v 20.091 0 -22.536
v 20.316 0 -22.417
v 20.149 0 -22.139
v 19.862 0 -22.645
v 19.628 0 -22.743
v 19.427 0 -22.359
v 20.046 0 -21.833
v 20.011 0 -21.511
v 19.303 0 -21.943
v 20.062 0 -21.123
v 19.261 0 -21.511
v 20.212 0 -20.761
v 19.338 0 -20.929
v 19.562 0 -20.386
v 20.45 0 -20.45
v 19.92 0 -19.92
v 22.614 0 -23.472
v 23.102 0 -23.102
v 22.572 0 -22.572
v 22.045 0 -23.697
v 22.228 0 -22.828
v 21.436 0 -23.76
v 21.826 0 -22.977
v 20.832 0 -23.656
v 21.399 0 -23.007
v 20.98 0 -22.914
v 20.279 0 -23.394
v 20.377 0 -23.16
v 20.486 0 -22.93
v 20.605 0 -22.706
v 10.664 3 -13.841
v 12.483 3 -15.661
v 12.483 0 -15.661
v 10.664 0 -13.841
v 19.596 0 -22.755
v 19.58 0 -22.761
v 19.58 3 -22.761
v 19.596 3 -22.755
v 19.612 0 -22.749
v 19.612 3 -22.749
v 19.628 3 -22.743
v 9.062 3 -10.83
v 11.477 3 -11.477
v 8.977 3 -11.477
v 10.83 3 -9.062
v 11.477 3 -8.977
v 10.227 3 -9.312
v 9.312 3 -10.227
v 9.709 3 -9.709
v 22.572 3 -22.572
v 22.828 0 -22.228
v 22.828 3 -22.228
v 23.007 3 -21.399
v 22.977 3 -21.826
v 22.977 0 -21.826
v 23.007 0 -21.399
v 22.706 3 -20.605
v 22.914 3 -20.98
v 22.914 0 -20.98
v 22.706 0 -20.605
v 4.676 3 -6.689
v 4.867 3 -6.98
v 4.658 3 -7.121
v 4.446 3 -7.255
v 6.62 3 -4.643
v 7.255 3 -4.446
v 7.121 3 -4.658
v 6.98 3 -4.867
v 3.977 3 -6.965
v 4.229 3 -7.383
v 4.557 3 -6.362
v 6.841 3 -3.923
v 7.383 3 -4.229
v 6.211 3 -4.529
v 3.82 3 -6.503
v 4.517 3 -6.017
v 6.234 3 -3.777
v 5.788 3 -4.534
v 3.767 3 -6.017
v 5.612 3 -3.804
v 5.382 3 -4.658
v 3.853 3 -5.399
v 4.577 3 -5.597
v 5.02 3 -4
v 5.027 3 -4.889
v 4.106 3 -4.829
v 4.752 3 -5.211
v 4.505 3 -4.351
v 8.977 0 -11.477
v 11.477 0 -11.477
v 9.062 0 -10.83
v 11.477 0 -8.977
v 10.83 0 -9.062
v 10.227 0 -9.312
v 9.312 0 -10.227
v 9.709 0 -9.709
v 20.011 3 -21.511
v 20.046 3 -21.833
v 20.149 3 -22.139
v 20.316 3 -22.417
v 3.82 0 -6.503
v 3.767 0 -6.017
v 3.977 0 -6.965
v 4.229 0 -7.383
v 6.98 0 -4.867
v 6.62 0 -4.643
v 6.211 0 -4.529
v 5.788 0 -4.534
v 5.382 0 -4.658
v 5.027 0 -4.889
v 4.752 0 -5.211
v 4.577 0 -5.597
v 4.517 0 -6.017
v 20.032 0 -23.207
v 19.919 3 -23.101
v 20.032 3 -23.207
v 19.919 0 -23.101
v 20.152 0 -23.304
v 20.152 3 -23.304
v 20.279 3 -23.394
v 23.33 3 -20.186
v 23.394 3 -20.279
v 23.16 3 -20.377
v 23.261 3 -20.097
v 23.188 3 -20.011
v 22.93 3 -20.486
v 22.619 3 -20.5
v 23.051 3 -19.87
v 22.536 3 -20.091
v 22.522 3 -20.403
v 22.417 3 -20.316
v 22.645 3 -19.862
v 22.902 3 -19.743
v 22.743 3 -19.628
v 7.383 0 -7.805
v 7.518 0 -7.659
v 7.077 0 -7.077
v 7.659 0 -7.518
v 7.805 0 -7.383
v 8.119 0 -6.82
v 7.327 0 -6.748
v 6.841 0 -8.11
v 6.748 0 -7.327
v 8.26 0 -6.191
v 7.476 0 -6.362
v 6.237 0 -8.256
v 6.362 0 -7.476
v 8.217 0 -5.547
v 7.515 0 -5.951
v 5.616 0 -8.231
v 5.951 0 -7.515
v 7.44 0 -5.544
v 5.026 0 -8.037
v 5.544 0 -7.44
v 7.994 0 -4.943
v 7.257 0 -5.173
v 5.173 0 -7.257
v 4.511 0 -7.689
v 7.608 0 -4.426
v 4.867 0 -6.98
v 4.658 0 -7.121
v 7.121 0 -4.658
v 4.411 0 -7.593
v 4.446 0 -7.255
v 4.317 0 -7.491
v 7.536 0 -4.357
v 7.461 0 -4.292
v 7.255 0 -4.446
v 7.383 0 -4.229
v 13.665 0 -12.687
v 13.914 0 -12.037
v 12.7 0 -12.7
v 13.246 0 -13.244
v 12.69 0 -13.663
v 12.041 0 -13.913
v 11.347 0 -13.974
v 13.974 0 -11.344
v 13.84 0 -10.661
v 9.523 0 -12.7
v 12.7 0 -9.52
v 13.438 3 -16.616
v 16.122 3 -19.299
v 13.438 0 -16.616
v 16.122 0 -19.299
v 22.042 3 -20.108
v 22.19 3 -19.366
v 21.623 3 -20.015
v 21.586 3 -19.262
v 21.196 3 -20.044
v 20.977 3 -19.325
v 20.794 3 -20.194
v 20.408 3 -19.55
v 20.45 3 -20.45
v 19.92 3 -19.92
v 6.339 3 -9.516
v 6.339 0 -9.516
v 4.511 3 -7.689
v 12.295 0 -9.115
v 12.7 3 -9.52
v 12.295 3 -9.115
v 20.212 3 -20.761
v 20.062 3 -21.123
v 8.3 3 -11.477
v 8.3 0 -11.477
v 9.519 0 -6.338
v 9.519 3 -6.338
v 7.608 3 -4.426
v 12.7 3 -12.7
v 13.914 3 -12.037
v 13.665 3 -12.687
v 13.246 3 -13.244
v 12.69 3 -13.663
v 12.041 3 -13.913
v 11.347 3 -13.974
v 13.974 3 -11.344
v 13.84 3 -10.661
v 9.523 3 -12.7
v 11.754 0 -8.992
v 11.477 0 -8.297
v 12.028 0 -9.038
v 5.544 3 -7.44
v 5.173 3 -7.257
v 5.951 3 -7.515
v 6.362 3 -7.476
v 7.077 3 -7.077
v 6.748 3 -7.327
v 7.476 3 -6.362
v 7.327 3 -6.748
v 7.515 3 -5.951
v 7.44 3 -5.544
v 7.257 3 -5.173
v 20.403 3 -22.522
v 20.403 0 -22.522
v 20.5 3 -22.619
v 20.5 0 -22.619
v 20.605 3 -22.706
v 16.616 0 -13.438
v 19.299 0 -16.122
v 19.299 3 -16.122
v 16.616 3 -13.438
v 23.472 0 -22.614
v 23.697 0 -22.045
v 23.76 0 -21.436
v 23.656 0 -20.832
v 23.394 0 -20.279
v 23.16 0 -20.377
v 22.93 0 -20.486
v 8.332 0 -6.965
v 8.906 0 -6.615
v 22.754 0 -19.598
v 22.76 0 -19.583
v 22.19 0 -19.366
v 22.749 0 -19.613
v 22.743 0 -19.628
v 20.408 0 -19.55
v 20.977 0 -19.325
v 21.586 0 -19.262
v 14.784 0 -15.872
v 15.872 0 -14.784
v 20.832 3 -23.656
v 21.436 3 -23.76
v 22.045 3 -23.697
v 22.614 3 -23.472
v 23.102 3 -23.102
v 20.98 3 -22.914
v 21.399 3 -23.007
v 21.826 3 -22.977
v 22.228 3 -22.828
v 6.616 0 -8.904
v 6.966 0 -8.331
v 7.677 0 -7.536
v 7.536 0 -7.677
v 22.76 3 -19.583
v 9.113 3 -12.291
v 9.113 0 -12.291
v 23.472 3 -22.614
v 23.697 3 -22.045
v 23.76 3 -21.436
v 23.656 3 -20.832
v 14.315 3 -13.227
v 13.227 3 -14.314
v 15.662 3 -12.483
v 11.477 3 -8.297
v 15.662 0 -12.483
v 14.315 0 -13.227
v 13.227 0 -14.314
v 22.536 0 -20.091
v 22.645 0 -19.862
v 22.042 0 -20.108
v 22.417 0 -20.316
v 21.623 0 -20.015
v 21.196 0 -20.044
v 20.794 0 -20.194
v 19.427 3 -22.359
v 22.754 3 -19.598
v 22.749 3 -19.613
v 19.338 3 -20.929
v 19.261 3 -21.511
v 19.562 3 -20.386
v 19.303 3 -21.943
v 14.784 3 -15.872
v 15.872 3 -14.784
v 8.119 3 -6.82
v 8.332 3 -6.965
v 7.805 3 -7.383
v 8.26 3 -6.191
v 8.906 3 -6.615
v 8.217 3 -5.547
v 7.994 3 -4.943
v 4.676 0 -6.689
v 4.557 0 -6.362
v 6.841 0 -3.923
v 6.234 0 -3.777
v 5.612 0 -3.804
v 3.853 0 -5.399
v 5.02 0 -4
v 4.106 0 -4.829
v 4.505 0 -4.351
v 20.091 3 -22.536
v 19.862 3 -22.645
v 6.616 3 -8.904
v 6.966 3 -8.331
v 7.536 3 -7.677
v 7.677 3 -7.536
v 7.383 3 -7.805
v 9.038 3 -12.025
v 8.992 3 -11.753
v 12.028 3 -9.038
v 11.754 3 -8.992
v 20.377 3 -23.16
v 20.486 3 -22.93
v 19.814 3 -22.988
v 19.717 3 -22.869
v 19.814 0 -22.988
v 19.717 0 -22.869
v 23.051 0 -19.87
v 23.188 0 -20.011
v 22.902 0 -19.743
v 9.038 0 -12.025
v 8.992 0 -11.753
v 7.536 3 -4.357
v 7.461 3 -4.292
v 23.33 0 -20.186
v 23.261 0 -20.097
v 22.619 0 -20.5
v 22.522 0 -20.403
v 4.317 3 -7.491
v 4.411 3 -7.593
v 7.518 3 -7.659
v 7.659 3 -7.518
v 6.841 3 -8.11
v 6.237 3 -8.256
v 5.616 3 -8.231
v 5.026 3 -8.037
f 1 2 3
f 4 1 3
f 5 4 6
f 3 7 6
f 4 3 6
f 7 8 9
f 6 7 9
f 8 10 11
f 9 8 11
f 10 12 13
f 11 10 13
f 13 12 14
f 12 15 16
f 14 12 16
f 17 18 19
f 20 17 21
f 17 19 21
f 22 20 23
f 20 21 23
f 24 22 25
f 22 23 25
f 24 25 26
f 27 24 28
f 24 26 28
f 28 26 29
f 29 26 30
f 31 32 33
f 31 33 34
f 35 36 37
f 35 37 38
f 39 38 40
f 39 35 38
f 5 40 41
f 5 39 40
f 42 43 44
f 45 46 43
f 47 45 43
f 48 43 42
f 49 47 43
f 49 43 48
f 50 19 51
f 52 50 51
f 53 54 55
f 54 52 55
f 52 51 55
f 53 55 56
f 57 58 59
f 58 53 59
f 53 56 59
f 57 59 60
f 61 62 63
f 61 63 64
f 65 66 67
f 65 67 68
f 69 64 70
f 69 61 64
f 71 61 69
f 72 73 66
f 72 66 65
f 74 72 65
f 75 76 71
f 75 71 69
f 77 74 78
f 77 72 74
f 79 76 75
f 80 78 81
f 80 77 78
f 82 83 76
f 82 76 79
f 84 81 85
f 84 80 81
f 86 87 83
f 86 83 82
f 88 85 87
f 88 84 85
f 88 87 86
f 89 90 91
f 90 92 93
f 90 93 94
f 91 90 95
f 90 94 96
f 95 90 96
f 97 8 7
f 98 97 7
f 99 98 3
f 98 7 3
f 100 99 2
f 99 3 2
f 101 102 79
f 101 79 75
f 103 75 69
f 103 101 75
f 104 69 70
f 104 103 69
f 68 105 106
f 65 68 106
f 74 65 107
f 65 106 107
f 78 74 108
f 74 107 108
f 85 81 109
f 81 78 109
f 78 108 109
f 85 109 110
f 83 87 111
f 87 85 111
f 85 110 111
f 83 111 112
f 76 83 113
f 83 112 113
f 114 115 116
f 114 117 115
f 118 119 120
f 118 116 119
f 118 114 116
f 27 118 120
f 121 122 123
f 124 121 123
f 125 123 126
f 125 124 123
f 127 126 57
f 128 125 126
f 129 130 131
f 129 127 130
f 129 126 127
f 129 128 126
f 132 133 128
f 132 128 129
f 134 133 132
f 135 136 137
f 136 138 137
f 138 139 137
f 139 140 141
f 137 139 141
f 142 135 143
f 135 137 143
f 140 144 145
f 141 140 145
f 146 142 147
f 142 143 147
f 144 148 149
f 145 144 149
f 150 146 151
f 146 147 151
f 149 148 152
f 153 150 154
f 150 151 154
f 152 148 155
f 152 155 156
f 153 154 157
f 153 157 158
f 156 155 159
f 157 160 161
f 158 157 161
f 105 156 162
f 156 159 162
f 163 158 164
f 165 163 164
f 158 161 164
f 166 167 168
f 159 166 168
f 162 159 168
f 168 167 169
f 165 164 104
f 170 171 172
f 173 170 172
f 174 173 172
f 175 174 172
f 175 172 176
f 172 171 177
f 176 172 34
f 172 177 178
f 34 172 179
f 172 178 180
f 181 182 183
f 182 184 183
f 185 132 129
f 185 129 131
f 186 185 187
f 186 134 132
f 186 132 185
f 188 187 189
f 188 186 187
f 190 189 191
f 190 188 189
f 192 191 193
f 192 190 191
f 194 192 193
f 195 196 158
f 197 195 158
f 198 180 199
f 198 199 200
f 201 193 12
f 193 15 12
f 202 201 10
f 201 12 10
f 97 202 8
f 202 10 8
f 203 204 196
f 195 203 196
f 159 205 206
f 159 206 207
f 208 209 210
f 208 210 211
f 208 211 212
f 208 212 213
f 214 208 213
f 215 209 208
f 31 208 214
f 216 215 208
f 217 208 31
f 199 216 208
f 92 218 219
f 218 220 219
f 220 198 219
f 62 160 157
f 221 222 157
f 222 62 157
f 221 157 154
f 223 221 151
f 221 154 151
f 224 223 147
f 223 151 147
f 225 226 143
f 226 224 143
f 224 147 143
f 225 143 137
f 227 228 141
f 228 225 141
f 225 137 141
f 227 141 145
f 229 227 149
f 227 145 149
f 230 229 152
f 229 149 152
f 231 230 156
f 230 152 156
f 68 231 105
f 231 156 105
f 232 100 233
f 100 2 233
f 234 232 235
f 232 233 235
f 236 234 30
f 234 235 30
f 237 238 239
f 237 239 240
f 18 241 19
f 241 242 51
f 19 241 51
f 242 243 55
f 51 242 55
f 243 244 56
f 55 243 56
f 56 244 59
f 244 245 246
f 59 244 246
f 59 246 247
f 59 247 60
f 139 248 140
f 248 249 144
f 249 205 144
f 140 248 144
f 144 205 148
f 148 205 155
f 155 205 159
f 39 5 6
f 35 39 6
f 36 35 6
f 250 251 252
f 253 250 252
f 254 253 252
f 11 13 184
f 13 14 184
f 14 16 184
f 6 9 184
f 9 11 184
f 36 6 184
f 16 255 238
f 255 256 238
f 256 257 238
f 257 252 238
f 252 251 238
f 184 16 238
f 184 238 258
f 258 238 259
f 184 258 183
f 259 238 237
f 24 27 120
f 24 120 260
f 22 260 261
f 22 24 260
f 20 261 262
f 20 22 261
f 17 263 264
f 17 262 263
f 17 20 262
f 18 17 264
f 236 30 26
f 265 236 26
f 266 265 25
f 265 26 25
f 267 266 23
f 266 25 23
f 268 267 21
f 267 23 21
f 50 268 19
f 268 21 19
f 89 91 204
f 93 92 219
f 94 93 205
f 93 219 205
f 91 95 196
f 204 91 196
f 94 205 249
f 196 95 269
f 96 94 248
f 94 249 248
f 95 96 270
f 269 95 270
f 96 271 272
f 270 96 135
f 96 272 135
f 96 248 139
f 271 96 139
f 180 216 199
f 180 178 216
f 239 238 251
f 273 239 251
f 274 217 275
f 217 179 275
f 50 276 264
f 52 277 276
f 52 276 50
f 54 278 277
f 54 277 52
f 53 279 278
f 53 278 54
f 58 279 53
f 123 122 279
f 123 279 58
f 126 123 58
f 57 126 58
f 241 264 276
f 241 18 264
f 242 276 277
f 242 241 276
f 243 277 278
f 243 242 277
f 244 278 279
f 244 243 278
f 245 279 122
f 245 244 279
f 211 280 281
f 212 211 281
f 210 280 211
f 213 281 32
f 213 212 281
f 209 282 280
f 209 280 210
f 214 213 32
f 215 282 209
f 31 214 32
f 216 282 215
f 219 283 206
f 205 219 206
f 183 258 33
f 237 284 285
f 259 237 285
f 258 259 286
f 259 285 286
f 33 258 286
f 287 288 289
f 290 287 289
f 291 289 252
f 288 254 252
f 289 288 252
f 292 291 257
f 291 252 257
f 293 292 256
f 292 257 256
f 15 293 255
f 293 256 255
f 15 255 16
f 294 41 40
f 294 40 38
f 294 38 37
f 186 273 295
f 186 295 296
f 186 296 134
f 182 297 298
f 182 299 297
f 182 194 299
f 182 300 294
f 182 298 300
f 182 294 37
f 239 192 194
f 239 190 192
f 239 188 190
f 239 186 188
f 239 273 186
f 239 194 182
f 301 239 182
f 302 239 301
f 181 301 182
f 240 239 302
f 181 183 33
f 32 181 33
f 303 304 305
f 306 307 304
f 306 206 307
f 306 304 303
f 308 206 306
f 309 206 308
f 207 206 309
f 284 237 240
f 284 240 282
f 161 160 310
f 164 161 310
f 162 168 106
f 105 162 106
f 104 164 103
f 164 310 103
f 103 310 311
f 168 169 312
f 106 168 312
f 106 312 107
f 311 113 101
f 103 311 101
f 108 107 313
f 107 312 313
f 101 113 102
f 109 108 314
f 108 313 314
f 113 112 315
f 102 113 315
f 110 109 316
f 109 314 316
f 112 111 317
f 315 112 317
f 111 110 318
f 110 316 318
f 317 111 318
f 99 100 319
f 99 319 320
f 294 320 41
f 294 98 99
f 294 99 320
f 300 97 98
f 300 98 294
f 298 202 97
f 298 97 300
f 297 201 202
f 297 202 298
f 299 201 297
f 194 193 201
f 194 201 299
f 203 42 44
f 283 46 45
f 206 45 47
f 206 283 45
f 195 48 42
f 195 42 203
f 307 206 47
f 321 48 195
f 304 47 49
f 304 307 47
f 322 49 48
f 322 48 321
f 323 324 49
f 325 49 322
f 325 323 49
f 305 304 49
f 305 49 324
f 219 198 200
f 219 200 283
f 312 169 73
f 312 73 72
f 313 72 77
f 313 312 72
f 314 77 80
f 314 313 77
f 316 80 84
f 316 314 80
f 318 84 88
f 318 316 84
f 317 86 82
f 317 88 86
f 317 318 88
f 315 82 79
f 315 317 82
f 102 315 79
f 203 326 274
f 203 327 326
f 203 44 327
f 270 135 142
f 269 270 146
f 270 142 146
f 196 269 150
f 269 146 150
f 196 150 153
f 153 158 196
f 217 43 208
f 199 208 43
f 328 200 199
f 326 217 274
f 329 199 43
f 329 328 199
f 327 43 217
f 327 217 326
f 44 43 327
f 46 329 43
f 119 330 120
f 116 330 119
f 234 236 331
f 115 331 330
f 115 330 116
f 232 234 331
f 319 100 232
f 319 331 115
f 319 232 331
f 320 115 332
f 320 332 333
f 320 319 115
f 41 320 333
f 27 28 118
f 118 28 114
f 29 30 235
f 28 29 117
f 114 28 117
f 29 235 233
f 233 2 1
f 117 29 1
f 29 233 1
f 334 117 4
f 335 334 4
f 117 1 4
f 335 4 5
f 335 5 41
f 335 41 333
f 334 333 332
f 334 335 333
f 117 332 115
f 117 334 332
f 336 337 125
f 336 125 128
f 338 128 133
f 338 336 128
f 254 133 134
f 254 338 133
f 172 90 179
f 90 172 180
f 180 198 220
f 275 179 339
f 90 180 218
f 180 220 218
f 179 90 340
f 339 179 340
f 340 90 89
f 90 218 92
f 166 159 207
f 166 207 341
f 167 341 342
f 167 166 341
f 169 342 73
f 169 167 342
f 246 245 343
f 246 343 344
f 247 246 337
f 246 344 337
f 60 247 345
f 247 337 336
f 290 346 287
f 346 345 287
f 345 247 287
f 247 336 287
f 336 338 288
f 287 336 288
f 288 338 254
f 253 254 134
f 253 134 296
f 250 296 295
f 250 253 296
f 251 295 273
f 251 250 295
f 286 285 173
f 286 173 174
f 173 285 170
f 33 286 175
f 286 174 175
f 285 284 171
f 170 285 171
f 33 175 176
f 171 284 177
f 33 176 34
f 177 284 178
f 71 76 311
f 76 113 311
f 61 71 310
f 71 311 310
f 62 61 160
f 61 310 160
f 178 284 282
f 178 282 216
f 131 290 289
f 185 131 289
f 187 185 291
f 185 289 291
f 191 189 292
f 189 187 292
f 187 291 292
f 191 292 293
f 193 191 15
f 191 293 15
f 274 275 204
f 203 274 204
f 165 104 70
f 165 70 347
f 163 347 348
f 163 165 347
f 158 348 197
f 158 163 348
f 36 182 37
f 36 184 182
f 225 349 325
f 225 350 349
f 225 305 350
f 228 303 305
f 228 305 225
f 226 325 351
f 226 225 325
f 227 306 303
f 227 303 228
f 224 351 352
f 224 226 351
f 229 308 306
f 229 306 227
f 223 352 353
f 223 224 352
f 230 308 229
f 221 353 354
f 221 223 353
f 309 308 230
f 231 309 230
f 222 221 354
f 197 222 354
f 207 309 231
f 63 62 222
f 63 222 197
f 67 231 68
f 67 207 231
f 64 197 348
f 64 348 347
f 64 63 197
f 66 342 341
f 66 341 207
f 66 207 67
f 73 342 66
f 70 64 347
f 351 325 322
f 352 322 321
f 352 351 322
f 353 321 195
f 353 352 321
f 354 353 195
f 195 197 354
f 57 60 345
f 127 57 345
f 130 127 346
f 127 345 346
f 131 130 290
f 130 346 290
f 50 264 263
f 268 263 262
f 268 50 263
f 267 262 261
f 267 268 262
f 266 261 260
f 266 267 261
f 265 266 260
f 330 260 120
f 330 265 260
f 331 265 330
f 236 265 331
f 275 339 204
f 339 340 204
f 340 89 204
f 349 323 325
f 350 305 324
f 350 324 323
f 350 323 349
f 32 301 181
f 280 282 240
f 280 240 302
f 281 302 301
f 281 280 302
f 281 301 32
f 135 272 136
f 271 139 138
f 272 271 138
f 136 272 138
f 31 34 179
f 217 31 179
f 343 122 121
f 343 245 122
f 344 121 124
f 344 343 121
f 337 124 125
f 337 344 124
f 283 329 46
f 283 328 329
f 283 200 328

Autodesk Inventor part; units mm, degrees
ref_plane "YZ Plane" through (0, 0, 0) normal (1, 0, 0) x (0, 1, 0)
ref_plane "XZ Plane" through (0, 0, 0) normal (0, 1, 0) x (-1, 0, 0)
ref_plane "XY Plane" through (0, 0, 0) normal (0, 0, 1) x (1, 0, 0)
sketch "Sketch1" plane through (0, 0, 0) normal (0, 1, 0) x (-1, 0, 0)
  circle A0 centre (-0.0319, -8.4999) radius 1.5
  circle A1 centre (8.4996, 0.0794) radius 1.5
  circle A2 centre (-8.4996, 0.0788) radius 1.5
  circle A3 centre (-0.0313, 8.4999) radius 1.5
  line L0 (-12.7, 12.7) -> (12.7, 12.7)
  line L1 (12.7, 12.7) -> (12.7, -12.7)
  line L2 (12.7, -12.7) -> (-12.7, -12.7)
  line L3 (-12.7, -12.7) -> (-12.7, 12.7)
  line L4 (-12.7, 12.7) -> (12.7, -12.7) construction
  line L5 (12.7, 12.7) -> (-12.7, -12.7) construction
  line L6 (-11.4771, 11.4771) -> (11.4771, 11.4771)
  line L7 (11.4771, 11.4771) -> (11.4771, -11.4771)
  line L8 (11.4771, -11.4771) -> (-11.4771, -11.4771)
  line L9 (-11.4771, -11.4771) -> (-11.4771, 11.4771)
  line L10 (-11.4771, 11.4771) -> (11.4771, -11.4771) construction
  line L11 (11.4771, 11.4771) -> (-11.4771, -11.4771) construction
  line L12 (-25.4, -25.4) -> (25.4, -25.4)
  line L13 (25.4, -25.4) -> (25.4, 25.4)
  line L14 (25.4, 25.4) -> (-25.4, 25.4)
  line L15 (-25.4, 25.4) -> (-25.4, -25.4)
  line L16 (-25.4, -25.4) -> (25.4, 25.4) construction
  line L17 (25.4, -25.4) -> (-25.4, 25.4) construction
  circle A4 centre (0, 0) radius 5.5
  circle A5 centre (11.4771, 11.4771) radius 5.5
  circle A6 centre (11.4771, -11.4771) radius 5.5
  circle A7 centre (-11.4771, 11.4771) radius 5.5
  circle A8 centre (-11.4771, -11.4771) radius 5.5
  circle A9 centre (-25.4, 25.4) radius 5.5
  circle A10 centre (25.4, 25.4) radius 5.5
  circle A11 centre (25.4, -25.4) radius 5.5
  circle A12 centre (-25.4, -25.4) radius 5.5
  line L18 (7.588, 15.3662) -> (21.5109, 29.2891)
  line L19 (29.2891, 21.5109) -> (15.3662, 7.588)
  line L20 (15.3662, -7.588) -> (29.2891, -21.5109)
  line L21 (-7.588, -15.3662) -> (-21.5109, -29.2891)
  line L22 (-29.2891, 21.5109) -> (-15.3662, 7.588)
  line L23 (7.588, -15.3662) -> (21.5109, -29.2891)
  line L24 (-15.3365, -7.5586) -> (-29.2595, -21.4815)
  line L25 (-7.6475, 15.4248) -> (-21.5108, 29.289)
  line L26 (-35, -35) -> (35, -35)
  line L27 (35, -35) -> (35, 35)
  line L28 (35, 35) -> (-35, 35)
  line L29 (-35, 35) -> (-35, -35)
  line L30 (-35, -35) -> (35, 35) construction
  line L31 (35, -35) -> (-35, 35) construction
  circle A13 centre (11.4771, 11.4771) radius 2.5
  circle A14 centre (25.4, 25.4) radius 2.5
  line L32 (27.1678, 23.6322) -> (13.2448, 9.7093)
  line L33 (23.6682, 27.203) -> (9.7093, 13.2449)
  line L34 (0, 0) -> (0, 35)
  line L35 (35, 0) -> (0, 0)
  line L36 (-27.1678, 23.6322) -> (-13.2448, 9.7093)
  circle A15 centre (-25.4, 25.4) radius 2.5
  line L37 (-23.6682, 27.203) -> (-9.7093, 13.2449)
  circle A16 centre (-11.4771, 11.4771) radius 2.5
  circle A17 centre (25.4, -25.4) radius 2.5
  line L38 (23.6682, -27.203) -> (9.7093, -13.2449)
  line L39 (27.1678, -23.6322) -> (13.2448, -9.7093)
  circle A18 centre (11.4771, -11.4771) radius 2.5
  circle A19 centre (-11.4771, -11.4771) radius 2.5
  line L40 (-23.6682, -27.203) -> (-9.7093, -13.2449)
  line L41 (-27.1678, -23.6322) -> (-13.2448, -9.7093)
  line L42 (25.4, 25.4) -> (-25.4, -25.4) construction
  circle A20 centre (-25.4, -25.4) radius 2.5
  circle A21 centre (0, 0) radius 8.509
  circle A22 centre (-6.0168, -6.0168) radius 1.5
  line L43 (-25.4, -25.4) -> (-17.6218, -17.6218)
  circle A23 centre (-17.6218, -17.6218) radius 5.5
  circle A24 centre (-6.0168, -6.0168) radius 2.25
  line L44 (-16.1218, -19.2989) -> (-4.5109, -7.6886)
  line L45 (-19.2988, -16.1217) -> (-7.6081, -4.4261)
  circle A25 centre (-21.5109, -21.5109) radius 1.5
  circle A26 centre (-21.5109, -21.5109) radius 2.25
  line L46 (-19.2988, -16.1217) -> (-23.1879, -20.0108)
  line L47 (-16.1218, -19.2989) -> (-19.9189, -23.1009)
  point P0 (-22.7602, -19.5832)
  point P1 (-22.7428, -19.6281)
  point P2 (-23.011, -19.8339)
  point P3 (-19.6281, -22.7428)
  point P4 (-19.5799, -22.7615)
  dimension "d24" = 17.018
  dimension "d0" = 8.5
  dimension "d1" = 8.5
  dimension "d2" = 8.5
  dimension "d3" = 8.5
  dimension "d4" = 3
  dimension "d5" = 3
  dimension "d6" = 3
  dimension "d7" = 3
  dimension "d8" = 25.4
  dimension "d9" = 25.4
  dimension "d10" = 50.8
  dimension "d11" = 50.8
  dimension "d12" = 11
  dimension "d13" = 11
  dimension "d14" = 11
  dimension "d15" = 11
  dimension "d16" = 11
  dimension "d17" = 11
  dimension "d18" = 11
  dimension "d19" = 11
  dimension "d20" = 11
  dimension "d21" = 70
  dimension "d22" = 5
  dimension "d23" = 5
  dimension "d25" = 3
  dimension "d26" = 11
  dimension "d28" = 4.5
  dimension "d33" = 3
  dimension "d34" = 4.5
extrude "Extrusion1" add sketch "Sketch1" along normal blind 3 contours A24 A8 A21 A22 | A21 A22 A24 | L44 A8 A24 | A24 A8 | A8 L44 L8 A19 L9 L45 A24 | A8 L45 A24 | L44 A19 L8 | A19 L44 L2 L3 L45 L9 L8 | L8 L9 A19 | L9 A19 L45 | L44 A19 L45 L3 L2 | L44 A23 L45 A19 | L44 A8 L45 A23 | L44 L47 A23 A26 L46 L45 A8 | A26 L43 A25 A12 | A12 A25 A23 A26 | A23 A25 L43 A26 | A26 A12 A25 L43 | A26 A23 A25 A12 | A26 L43 A25 A23
properties part number "link"
